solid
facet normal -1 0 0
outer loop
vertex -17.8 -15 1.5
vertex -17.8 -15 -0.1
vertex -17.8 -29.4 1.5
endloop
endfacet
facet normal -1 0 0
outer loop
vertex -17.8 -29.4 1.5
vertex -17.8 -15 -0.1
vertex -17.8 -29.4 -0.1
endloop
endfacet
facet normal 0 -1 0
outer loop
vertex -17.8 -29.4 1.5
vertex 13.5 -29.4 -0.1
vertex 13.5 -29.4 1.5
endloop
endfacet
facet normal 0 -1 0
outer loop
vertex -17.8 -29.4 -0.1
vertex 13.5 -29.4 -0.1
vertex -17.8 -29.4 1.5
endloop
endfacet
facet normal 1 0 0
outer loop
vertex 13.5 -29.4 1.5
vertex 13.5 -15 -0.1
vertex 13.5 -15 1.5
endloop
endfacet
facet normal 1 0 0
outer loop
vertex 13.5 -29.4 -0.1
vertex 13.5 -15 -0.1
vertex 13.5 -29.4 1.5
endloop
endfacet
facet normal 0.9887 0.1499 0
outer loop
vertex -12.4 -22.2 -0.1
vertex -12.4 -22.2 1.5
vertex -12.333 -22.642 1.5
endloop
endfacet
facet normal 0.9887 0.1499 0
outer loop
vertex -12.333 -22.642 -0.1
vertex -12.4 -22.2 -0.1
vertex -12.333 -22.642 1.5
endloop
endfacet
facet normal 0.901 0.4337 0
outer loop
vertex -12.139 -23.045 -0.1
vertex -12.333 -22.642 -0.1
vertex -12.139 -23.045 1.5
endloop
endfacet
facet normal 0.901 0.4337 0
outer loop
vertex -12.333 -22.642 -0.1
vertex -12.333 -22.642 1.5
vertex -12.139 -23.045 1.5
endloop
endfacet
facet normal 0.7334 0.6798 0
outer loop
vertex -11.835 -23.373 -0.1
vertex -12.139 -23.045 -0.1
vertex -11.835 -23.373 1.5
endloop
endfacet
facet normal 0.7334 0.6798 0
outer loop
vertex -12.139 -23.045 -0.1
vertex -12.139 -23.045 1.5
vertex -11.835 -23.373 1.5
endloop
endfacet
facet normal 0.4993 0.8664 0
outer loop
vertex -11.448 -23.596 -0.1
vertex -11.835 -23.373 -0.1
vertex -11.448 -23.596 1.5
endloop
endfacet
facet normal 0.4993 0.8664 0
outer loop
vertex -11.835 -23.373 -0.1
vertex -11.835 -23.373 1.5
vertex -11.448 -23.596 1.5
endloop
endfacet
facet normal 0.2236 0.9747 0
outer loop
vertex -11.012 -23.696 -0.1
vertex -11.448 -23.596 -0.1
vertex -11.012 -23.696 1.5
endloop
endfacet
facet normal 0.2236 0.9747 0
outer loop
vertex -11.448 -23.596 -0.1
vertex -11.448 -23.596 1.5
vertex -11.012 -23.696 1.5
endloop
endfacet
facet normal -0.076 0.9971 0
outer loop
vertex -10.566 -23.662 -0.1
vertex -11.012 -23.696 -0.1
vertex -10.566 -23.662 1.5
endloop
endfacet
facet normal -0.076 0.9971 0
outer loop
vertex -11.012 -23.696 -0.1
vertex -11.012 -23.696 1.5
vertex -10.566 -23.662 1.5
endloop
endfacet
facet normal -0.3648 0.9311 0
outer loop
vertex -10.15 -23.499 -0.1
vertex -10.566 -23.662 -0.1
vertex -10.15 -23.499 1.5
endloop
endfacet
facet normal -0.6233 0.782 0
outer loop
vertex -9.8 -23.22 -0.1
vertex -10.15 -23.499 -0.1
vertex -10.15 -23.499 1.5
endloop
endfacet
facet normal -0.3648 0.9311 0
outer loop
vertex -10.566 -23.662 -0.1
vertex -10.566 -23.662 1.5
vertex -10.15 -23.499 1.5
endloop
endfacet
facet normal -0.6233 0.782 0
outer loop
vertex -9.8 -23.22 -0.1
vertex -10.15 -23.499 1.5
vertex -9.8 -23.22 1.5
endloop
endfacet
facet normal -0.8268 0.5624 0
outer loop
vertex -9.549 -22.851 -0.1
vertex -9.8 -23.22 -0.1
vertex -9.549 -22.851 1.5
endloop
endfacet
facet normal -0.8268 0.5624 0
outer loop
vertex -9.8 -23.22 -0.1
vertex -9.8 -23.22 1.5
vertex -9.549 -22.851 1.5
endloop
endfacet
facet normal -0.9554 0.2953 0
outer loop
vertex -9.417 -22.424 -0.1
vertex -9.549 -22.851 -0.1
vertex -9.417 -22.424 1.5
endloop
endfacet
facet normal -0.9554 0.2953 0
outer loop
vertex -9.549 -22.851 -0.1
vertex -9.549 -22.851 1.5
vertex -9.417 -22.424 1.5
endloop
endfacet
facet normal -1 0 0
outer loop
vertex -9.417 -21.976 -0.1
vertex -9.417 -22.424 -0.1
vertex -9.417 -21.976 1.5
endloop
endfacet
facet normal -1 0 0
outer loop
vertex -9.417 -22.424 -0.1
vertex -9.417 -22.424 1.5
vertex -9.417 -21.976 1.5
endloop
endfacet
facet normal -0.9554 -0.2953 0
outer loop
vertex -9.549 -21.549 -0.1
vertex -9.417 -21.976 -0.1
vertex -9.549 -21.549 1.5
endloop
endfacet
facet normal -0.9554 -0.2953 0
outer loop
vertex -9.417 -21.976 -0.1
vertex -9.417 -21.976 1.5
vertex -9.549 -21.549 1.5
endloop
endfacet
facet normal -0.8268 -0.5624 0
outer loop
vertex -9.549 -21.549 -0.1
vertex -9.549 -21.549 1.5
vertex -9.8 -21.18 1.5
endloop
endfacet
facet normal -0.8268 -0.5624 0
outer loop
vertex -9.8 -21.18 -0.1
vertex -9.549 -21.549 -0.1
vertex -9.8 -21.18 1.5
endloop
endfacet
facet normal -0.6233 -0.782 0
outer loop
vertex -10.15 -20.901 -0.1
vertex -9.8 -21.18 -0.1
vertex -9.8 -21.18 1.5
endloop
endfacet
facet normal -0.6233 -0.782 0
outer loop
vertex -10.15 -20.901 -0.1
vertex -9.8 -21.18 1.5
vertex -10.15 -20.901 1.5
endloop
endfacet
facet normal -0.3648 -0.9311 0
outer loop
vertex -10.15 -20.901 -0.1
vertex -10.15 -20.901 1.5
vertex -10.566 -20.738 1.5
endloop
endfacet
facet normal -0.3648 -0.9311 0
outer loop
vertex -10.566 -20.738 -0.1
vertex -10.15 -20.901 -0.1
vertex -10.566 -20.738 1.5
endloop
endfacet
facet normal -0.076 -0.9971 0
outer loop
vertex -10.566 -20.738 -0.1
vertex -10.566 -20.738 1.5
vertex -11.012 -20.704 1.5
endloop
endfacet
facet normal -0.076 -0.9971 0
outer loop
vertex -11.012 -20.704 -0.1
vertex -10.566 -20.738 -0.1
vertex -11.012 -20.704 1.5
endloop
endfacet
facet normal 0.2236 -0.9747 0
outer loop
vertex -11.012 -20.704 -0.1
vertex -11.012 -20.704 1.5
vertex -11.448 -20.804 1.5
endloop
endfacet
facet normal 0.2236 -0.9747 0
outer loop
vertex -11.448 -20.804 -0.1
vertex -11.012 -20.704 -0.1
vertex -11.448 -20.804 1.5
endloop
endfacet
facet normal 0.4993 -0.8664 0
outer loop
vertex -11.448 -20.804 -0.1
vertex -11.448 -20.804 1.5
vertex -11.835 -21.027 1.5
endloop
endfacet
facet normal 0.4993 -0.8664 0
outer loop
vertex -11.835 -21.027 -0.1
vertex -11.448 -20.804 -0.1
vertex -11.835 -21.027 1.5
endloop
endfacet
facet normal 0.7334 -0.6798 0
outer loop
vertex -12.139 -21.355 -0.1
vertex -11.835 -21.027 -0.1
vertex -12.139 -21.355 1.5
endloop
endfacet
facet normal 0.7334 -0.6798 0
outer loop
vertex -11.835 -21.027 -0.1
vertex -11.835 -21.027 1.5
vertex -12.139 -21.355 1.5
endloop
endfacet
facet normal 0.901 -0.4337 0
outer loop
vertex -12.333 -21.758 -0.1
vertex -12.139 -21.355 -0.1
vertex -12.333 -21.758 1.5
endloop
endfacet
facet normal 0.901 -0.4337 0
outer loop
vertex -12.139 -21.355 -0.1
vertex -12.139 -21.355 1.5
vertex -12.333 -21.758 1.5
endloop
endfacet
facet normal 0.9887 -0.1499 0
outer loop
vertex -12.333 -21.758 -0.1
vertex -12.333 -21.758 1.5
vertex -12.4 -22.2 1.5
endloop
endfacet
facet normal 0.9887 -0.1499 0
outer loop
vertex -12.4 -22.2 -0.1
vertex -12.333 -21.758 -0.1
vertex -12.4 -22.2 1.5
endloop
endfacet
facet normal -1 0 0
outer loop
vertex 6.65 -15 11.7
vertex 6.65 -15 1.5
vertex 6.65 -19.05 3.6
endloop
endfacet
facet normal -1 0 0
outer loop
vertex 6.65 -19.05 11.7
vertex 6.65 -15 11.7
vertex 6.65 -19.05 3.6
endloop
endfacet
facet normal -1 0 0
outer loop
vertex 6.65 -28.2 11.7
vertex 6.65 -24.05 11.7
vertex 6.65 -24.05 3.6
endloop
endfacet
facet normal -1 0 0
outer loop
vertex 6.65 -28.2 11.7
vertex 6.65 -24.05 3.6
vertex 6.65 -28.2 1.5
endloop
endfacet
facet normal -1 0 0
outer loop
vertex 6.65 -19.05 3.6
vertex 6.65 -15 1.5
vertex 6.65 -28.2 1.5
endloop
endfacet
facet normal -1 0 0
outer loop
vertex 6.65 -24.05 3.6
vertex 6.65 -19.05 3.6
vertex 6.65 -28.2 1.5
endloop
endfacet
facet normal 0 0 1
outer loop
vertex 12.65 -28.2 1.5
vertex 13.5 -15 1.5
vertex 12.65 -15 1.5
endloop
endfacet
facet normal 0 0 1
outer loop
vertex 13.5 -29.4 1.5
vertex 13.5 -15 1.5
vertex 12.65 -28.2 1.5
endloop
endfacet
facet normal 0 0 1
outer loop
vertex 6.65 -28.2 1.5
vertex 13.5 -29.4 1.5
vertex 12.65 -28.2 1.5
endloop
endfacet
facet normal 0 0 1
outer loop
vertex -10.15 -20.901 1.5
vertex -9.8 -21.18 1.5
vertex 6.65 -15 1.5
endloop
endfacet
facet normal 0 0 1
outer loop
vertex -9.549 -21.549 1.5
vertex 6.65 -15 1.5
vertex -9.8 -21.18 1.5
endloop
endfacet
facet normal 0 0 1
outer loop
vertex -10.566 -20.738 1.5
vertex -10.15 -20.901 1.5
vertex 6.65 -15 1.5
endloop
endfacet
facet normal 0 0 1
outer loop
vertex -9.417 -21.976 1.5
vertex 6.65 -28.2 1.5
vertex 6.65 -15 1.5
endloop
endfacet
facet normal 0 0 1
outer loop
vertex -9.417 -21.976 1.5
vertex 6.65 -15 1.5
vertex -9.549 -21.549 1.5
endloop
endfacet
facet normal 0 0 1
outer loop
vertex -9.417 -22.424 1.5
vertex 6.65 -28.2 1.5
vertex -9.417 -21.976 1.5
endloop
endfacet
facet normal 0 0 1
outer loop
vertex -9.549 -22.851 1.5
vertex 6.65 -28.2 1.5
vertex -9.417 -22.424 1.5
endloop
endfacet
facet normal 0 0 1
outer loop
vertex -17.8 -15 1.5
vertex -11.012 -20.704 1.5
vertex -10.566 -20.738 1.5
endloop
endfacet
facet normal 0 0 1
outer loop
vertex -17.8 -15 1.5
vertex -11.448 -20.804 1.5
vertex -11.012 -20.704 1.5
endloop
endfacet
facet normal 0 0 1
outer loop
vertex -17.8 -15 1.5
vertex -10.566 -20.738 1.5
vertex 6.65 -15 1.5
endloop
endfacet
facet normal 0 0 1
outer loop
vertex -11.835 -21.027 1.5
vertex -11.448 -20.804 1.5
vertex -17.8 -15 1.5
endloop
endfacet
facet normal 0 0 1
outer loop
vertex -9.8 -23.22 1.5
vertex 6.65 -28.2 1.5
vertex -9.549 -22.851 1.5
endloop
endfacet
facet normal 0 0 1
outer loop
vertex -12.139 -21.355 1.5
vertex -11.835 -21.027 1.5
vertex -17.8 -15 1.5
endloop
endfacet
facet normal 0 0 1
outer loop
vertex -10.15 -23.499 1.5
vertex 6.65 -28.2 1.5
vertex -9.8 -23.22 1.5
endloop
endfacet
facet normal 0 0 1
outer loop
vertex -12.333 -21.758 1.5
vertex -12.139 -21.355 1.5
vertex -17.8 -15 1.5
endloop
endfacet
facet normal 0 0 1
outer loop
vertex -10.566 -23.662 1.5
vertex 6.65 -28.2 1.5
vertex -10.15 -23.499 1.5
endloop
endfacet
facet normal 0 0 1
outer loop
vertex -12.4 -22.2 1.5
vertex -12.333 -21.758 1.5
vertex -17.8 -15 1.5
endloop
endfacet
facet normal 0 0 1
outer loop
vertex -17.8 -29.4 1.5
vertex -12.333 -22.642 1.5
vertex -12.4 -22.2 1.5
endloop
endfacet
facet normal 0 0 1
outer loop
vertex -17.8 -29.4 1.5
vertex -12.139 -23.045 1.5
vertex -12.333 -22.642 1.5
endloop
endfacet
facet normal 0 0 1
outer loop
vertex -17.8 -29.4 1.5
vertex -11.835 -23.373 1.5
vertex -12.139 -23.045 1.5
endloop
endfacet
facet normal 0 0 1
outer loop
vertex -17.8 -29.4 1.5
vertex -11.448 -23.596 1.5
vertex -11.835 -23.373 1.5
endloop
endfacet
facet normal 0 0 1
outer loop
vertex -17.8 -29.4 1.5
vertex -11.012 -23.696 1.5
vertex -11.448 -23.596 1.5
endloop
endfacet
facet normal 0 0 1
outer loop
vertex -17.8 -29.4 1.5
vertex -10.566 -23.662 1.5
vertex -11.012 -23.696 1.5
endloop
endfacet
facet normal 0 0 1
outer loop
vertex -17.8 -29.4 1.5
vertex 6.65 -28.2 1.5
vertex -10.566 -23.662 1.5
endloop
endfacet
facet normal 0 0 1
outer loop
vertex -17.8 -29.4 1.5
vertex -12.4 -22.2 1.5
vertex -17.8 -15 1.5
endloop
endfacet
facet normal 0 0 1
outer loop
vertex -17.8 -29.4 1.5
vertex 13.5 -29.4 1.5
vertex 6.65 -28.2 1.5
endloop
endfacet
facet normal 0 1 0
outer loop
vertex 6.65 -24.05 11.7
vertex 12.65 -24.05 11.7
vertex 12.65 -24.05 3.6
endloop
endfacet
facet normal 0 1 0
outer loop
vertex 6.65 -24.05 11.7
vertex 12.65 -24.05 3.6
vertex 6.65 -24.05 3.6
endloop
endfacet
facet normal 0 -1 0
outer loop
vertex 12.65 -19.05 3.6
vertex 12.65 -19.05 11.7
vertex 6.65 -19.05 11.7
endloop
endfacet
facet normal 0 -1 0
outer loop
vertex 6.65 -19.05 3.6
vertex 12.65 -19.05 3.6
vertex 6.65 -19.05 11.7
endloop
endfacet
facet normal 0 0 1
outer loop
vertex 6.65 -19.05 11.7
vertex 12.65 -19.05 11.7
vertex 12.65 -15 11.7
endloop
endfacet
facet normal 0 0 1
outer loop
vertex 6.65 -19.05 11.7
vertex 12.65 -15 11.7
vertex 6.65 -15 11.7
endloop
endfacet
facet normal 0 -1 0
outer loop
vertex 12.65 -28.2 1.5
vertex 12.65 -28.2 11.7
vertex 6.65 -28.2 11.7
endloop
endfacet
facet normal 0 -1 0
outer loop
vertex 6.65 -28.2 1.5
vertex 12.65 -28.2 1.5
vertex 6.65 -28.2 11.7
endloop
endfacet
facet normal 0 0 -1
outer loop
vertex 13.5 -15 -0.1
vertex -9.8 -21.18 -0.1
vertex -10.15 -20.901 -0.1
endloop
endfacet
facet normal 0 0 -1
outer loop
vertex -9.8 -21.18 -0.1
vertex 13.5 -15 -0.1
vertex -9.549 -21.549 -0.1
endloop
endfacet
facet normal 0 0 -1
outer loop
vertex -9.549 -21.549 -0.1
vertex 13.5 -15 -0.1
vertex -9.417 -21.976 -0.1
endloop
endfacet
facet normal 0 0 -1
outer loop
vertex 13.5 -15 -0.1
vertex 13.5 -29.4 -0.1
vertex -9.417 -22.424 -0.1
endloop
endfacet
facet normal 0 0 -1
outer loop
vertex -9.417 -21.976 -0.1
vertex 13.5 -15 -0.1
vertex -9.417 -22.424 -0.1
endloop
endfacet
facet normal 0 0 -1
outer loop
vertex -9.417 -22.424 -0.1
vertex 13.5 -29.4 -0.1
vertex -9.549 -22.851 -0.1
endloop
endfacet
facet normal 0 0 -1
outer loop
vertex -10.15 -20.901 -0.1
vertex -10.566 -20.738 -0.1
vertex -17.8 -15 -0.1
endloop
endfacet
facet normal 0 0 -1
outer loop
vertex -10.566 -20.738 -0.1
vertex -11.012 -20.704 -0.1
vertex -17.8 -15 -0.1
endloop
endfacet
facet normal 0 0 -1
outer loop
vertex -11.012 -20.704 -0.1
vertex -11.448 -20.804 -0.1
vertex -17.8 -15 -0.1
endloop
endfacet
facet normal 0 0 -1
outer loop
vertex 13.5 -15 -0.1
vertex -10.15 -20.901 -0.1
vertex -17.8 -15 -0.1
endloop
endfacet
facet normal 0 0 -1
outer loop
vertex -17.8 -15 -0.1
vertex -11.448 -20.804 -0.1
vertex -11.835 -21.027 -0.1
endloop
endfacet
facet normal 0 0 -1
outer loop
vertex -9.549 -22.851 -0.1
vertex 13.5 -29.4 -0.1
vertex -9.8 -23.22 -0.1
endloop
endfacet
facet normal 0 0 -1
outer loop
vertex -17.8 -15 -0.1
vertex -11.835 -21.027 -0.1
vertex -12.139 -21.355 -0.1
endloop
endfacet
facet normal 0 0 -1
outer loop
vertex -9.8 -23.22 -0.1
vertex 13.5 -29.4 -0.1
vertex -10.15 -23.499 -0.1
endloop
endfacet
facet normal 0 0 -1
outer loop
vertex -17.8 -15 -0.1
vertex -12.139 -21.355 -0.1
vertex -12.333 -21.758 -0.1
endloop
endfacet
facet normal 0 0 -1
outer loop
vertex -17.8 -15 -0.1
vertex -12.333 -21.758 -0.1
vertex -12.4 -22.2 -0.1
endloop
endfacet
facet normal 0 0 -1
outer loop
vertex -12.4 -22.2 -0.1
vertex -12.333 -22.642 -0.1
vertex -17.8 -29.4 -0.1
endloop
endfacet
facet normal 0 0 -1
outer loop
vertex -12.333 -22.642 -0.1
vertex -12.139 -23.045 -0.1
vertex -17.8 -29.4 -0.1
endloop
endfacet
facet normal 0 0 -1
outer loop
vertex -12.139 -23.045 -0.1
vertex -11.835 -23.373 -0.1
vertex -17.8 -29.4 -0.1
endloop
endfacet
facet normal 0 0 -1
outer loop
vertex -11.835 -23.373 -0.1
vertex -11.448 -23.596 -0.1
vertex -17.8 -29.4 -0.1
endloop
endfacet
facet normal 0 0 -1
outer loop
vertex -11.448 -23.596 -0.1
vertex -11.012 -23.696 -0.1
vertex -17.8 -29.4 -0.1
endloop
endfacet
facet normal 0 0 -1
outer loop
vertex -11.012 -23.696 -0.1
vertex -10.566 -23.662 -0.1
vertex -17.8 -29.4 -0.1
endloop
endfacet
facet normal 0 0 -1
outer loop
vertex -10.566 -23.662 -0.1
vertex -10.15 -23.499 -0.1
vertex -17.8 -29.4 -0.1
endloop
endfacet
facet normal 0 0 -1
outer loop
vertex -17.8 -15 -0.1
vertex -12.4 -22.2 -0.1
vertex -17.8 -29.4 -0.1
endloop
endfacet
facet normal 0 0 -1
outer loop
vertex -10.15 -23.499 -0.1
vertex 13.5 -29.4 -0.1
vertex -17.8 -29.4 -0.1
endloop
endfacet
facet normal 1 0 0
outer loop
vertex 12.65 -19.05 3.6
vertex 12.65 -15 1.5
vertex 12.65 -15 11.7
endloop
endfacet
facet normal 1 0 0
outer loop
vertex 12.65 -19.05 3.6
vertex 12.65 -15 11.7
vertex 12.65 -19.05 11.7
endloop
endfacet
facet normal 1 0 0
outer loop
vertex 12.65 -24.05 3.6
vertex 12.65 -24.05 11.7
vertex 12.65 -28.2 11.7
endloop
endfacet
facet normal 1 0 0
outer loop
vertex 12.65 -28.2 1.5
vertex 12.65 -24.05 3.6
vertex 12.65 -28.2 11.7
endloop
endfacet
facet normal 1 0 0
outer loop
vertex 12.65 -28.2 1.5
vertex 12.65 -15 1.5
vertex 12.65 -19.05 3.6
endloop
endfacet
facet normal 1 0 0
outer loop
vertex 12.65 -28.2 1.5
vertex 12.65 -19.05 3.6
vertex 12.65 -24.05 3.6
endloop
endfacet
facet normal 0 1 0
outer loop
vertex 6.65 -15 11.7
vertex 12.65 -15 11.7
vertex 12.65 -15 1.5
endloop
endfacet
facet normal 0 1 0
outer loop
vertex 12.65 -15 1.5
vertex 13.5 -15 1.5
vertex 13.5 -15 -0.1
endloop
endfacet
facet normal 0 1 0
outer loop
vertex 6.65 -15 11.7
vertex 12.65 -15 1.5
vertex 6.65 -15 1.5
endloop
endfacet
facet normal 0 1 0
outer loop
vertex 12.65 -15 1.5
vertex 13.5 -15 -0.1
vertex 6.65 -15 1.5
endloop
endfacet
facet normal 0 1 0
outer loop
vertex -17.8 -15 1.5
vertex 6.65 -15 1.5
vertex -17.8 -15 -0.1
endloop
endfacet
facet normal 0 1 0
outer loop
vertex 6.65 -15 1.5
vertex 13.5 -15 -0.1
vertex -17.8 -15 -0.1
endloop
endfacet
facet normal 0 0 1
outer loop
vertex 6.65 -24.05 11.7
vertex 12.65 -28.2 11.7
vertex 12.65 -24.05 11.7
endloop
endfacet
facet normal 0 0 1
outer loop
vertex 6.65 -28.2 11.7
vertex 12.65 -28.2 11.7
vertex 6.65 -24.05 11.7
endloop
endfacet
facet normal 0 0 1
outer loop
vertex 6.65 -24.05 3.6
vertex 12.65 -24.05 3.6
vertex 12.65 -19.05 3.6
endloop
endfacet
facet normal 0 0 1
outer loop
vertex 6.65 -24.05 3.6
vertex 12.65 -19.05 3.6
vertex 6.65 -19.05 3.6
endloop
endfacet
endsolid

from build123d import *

# Parameters (mm, degrees)
SKETCH016_W             = 31.3
SKETCH016_H             = 14.4
PAD007_DEPTH            = 1.6
SKETCH017_R             = 1.5
POCKET006_DEPTH         = 1.6
SKETCH018_W             = 6
SKETCH018_H             = 13.2
PAD008_DEPTH            = 10.2
SKETCH019_W             = 6
SKETCH019_H             = 5
POCKET007_DEPTH         = 8.1
BODY004_PLACEMENT_ANGLE = 180


with BuildPart() as part:
    # Sketch016 → Pad007 (new body)
    with BuildSketch(Plane.XY.offset(-1.6)):
        with Locations((15.65, 7.2)):
            Rectangle(SKETCH016_W, SKETCH016_H)
    extrude(amount=PAD007_DEPTH)

    # Sketch017 (on Face6 of Pad007) → Pocket006 (cut)
    with BuildSketch(Plane.XY):
        with Locations((24.4, 7.2)):
            Circle(SKETCH017_R)
    extrude(amount=-POCKET006_DEPTH, mode=Mode.SUBTRACT)

    # Sketch018 (on Face5 of Pocket006) → Pad008 (join)
    with BuildSketch(Plane.XY):
        with Locations((3.85, 6.6)):
            Rectangle(SKETCH018_W, SKETCH018_H)
    extrude(amount=PAD008_DEPTH)

    # Sketch019 (on Face12 of Pad008) → Pocket007 (cut)
    with BuildSketch(Plane.XY.offset(10.2)):
        with Locations((3.85, 6.55)):
            Rectangle(SKETCH019_W, SKETCH019_H)
    extrude(amount=-POCKET007_DEPTH, mode=Mode.SUBTRACT)


with BuildPart() as part_1:
    # Body004 placement: moved
    add(part.part.moved(Location((13.5, -15, 1.5))).rotate(Axis((13.5, -15, 1.5), (0, 0, 1)), BODY004_PLACEMENT_ANGLE))


solid = part_1.part
